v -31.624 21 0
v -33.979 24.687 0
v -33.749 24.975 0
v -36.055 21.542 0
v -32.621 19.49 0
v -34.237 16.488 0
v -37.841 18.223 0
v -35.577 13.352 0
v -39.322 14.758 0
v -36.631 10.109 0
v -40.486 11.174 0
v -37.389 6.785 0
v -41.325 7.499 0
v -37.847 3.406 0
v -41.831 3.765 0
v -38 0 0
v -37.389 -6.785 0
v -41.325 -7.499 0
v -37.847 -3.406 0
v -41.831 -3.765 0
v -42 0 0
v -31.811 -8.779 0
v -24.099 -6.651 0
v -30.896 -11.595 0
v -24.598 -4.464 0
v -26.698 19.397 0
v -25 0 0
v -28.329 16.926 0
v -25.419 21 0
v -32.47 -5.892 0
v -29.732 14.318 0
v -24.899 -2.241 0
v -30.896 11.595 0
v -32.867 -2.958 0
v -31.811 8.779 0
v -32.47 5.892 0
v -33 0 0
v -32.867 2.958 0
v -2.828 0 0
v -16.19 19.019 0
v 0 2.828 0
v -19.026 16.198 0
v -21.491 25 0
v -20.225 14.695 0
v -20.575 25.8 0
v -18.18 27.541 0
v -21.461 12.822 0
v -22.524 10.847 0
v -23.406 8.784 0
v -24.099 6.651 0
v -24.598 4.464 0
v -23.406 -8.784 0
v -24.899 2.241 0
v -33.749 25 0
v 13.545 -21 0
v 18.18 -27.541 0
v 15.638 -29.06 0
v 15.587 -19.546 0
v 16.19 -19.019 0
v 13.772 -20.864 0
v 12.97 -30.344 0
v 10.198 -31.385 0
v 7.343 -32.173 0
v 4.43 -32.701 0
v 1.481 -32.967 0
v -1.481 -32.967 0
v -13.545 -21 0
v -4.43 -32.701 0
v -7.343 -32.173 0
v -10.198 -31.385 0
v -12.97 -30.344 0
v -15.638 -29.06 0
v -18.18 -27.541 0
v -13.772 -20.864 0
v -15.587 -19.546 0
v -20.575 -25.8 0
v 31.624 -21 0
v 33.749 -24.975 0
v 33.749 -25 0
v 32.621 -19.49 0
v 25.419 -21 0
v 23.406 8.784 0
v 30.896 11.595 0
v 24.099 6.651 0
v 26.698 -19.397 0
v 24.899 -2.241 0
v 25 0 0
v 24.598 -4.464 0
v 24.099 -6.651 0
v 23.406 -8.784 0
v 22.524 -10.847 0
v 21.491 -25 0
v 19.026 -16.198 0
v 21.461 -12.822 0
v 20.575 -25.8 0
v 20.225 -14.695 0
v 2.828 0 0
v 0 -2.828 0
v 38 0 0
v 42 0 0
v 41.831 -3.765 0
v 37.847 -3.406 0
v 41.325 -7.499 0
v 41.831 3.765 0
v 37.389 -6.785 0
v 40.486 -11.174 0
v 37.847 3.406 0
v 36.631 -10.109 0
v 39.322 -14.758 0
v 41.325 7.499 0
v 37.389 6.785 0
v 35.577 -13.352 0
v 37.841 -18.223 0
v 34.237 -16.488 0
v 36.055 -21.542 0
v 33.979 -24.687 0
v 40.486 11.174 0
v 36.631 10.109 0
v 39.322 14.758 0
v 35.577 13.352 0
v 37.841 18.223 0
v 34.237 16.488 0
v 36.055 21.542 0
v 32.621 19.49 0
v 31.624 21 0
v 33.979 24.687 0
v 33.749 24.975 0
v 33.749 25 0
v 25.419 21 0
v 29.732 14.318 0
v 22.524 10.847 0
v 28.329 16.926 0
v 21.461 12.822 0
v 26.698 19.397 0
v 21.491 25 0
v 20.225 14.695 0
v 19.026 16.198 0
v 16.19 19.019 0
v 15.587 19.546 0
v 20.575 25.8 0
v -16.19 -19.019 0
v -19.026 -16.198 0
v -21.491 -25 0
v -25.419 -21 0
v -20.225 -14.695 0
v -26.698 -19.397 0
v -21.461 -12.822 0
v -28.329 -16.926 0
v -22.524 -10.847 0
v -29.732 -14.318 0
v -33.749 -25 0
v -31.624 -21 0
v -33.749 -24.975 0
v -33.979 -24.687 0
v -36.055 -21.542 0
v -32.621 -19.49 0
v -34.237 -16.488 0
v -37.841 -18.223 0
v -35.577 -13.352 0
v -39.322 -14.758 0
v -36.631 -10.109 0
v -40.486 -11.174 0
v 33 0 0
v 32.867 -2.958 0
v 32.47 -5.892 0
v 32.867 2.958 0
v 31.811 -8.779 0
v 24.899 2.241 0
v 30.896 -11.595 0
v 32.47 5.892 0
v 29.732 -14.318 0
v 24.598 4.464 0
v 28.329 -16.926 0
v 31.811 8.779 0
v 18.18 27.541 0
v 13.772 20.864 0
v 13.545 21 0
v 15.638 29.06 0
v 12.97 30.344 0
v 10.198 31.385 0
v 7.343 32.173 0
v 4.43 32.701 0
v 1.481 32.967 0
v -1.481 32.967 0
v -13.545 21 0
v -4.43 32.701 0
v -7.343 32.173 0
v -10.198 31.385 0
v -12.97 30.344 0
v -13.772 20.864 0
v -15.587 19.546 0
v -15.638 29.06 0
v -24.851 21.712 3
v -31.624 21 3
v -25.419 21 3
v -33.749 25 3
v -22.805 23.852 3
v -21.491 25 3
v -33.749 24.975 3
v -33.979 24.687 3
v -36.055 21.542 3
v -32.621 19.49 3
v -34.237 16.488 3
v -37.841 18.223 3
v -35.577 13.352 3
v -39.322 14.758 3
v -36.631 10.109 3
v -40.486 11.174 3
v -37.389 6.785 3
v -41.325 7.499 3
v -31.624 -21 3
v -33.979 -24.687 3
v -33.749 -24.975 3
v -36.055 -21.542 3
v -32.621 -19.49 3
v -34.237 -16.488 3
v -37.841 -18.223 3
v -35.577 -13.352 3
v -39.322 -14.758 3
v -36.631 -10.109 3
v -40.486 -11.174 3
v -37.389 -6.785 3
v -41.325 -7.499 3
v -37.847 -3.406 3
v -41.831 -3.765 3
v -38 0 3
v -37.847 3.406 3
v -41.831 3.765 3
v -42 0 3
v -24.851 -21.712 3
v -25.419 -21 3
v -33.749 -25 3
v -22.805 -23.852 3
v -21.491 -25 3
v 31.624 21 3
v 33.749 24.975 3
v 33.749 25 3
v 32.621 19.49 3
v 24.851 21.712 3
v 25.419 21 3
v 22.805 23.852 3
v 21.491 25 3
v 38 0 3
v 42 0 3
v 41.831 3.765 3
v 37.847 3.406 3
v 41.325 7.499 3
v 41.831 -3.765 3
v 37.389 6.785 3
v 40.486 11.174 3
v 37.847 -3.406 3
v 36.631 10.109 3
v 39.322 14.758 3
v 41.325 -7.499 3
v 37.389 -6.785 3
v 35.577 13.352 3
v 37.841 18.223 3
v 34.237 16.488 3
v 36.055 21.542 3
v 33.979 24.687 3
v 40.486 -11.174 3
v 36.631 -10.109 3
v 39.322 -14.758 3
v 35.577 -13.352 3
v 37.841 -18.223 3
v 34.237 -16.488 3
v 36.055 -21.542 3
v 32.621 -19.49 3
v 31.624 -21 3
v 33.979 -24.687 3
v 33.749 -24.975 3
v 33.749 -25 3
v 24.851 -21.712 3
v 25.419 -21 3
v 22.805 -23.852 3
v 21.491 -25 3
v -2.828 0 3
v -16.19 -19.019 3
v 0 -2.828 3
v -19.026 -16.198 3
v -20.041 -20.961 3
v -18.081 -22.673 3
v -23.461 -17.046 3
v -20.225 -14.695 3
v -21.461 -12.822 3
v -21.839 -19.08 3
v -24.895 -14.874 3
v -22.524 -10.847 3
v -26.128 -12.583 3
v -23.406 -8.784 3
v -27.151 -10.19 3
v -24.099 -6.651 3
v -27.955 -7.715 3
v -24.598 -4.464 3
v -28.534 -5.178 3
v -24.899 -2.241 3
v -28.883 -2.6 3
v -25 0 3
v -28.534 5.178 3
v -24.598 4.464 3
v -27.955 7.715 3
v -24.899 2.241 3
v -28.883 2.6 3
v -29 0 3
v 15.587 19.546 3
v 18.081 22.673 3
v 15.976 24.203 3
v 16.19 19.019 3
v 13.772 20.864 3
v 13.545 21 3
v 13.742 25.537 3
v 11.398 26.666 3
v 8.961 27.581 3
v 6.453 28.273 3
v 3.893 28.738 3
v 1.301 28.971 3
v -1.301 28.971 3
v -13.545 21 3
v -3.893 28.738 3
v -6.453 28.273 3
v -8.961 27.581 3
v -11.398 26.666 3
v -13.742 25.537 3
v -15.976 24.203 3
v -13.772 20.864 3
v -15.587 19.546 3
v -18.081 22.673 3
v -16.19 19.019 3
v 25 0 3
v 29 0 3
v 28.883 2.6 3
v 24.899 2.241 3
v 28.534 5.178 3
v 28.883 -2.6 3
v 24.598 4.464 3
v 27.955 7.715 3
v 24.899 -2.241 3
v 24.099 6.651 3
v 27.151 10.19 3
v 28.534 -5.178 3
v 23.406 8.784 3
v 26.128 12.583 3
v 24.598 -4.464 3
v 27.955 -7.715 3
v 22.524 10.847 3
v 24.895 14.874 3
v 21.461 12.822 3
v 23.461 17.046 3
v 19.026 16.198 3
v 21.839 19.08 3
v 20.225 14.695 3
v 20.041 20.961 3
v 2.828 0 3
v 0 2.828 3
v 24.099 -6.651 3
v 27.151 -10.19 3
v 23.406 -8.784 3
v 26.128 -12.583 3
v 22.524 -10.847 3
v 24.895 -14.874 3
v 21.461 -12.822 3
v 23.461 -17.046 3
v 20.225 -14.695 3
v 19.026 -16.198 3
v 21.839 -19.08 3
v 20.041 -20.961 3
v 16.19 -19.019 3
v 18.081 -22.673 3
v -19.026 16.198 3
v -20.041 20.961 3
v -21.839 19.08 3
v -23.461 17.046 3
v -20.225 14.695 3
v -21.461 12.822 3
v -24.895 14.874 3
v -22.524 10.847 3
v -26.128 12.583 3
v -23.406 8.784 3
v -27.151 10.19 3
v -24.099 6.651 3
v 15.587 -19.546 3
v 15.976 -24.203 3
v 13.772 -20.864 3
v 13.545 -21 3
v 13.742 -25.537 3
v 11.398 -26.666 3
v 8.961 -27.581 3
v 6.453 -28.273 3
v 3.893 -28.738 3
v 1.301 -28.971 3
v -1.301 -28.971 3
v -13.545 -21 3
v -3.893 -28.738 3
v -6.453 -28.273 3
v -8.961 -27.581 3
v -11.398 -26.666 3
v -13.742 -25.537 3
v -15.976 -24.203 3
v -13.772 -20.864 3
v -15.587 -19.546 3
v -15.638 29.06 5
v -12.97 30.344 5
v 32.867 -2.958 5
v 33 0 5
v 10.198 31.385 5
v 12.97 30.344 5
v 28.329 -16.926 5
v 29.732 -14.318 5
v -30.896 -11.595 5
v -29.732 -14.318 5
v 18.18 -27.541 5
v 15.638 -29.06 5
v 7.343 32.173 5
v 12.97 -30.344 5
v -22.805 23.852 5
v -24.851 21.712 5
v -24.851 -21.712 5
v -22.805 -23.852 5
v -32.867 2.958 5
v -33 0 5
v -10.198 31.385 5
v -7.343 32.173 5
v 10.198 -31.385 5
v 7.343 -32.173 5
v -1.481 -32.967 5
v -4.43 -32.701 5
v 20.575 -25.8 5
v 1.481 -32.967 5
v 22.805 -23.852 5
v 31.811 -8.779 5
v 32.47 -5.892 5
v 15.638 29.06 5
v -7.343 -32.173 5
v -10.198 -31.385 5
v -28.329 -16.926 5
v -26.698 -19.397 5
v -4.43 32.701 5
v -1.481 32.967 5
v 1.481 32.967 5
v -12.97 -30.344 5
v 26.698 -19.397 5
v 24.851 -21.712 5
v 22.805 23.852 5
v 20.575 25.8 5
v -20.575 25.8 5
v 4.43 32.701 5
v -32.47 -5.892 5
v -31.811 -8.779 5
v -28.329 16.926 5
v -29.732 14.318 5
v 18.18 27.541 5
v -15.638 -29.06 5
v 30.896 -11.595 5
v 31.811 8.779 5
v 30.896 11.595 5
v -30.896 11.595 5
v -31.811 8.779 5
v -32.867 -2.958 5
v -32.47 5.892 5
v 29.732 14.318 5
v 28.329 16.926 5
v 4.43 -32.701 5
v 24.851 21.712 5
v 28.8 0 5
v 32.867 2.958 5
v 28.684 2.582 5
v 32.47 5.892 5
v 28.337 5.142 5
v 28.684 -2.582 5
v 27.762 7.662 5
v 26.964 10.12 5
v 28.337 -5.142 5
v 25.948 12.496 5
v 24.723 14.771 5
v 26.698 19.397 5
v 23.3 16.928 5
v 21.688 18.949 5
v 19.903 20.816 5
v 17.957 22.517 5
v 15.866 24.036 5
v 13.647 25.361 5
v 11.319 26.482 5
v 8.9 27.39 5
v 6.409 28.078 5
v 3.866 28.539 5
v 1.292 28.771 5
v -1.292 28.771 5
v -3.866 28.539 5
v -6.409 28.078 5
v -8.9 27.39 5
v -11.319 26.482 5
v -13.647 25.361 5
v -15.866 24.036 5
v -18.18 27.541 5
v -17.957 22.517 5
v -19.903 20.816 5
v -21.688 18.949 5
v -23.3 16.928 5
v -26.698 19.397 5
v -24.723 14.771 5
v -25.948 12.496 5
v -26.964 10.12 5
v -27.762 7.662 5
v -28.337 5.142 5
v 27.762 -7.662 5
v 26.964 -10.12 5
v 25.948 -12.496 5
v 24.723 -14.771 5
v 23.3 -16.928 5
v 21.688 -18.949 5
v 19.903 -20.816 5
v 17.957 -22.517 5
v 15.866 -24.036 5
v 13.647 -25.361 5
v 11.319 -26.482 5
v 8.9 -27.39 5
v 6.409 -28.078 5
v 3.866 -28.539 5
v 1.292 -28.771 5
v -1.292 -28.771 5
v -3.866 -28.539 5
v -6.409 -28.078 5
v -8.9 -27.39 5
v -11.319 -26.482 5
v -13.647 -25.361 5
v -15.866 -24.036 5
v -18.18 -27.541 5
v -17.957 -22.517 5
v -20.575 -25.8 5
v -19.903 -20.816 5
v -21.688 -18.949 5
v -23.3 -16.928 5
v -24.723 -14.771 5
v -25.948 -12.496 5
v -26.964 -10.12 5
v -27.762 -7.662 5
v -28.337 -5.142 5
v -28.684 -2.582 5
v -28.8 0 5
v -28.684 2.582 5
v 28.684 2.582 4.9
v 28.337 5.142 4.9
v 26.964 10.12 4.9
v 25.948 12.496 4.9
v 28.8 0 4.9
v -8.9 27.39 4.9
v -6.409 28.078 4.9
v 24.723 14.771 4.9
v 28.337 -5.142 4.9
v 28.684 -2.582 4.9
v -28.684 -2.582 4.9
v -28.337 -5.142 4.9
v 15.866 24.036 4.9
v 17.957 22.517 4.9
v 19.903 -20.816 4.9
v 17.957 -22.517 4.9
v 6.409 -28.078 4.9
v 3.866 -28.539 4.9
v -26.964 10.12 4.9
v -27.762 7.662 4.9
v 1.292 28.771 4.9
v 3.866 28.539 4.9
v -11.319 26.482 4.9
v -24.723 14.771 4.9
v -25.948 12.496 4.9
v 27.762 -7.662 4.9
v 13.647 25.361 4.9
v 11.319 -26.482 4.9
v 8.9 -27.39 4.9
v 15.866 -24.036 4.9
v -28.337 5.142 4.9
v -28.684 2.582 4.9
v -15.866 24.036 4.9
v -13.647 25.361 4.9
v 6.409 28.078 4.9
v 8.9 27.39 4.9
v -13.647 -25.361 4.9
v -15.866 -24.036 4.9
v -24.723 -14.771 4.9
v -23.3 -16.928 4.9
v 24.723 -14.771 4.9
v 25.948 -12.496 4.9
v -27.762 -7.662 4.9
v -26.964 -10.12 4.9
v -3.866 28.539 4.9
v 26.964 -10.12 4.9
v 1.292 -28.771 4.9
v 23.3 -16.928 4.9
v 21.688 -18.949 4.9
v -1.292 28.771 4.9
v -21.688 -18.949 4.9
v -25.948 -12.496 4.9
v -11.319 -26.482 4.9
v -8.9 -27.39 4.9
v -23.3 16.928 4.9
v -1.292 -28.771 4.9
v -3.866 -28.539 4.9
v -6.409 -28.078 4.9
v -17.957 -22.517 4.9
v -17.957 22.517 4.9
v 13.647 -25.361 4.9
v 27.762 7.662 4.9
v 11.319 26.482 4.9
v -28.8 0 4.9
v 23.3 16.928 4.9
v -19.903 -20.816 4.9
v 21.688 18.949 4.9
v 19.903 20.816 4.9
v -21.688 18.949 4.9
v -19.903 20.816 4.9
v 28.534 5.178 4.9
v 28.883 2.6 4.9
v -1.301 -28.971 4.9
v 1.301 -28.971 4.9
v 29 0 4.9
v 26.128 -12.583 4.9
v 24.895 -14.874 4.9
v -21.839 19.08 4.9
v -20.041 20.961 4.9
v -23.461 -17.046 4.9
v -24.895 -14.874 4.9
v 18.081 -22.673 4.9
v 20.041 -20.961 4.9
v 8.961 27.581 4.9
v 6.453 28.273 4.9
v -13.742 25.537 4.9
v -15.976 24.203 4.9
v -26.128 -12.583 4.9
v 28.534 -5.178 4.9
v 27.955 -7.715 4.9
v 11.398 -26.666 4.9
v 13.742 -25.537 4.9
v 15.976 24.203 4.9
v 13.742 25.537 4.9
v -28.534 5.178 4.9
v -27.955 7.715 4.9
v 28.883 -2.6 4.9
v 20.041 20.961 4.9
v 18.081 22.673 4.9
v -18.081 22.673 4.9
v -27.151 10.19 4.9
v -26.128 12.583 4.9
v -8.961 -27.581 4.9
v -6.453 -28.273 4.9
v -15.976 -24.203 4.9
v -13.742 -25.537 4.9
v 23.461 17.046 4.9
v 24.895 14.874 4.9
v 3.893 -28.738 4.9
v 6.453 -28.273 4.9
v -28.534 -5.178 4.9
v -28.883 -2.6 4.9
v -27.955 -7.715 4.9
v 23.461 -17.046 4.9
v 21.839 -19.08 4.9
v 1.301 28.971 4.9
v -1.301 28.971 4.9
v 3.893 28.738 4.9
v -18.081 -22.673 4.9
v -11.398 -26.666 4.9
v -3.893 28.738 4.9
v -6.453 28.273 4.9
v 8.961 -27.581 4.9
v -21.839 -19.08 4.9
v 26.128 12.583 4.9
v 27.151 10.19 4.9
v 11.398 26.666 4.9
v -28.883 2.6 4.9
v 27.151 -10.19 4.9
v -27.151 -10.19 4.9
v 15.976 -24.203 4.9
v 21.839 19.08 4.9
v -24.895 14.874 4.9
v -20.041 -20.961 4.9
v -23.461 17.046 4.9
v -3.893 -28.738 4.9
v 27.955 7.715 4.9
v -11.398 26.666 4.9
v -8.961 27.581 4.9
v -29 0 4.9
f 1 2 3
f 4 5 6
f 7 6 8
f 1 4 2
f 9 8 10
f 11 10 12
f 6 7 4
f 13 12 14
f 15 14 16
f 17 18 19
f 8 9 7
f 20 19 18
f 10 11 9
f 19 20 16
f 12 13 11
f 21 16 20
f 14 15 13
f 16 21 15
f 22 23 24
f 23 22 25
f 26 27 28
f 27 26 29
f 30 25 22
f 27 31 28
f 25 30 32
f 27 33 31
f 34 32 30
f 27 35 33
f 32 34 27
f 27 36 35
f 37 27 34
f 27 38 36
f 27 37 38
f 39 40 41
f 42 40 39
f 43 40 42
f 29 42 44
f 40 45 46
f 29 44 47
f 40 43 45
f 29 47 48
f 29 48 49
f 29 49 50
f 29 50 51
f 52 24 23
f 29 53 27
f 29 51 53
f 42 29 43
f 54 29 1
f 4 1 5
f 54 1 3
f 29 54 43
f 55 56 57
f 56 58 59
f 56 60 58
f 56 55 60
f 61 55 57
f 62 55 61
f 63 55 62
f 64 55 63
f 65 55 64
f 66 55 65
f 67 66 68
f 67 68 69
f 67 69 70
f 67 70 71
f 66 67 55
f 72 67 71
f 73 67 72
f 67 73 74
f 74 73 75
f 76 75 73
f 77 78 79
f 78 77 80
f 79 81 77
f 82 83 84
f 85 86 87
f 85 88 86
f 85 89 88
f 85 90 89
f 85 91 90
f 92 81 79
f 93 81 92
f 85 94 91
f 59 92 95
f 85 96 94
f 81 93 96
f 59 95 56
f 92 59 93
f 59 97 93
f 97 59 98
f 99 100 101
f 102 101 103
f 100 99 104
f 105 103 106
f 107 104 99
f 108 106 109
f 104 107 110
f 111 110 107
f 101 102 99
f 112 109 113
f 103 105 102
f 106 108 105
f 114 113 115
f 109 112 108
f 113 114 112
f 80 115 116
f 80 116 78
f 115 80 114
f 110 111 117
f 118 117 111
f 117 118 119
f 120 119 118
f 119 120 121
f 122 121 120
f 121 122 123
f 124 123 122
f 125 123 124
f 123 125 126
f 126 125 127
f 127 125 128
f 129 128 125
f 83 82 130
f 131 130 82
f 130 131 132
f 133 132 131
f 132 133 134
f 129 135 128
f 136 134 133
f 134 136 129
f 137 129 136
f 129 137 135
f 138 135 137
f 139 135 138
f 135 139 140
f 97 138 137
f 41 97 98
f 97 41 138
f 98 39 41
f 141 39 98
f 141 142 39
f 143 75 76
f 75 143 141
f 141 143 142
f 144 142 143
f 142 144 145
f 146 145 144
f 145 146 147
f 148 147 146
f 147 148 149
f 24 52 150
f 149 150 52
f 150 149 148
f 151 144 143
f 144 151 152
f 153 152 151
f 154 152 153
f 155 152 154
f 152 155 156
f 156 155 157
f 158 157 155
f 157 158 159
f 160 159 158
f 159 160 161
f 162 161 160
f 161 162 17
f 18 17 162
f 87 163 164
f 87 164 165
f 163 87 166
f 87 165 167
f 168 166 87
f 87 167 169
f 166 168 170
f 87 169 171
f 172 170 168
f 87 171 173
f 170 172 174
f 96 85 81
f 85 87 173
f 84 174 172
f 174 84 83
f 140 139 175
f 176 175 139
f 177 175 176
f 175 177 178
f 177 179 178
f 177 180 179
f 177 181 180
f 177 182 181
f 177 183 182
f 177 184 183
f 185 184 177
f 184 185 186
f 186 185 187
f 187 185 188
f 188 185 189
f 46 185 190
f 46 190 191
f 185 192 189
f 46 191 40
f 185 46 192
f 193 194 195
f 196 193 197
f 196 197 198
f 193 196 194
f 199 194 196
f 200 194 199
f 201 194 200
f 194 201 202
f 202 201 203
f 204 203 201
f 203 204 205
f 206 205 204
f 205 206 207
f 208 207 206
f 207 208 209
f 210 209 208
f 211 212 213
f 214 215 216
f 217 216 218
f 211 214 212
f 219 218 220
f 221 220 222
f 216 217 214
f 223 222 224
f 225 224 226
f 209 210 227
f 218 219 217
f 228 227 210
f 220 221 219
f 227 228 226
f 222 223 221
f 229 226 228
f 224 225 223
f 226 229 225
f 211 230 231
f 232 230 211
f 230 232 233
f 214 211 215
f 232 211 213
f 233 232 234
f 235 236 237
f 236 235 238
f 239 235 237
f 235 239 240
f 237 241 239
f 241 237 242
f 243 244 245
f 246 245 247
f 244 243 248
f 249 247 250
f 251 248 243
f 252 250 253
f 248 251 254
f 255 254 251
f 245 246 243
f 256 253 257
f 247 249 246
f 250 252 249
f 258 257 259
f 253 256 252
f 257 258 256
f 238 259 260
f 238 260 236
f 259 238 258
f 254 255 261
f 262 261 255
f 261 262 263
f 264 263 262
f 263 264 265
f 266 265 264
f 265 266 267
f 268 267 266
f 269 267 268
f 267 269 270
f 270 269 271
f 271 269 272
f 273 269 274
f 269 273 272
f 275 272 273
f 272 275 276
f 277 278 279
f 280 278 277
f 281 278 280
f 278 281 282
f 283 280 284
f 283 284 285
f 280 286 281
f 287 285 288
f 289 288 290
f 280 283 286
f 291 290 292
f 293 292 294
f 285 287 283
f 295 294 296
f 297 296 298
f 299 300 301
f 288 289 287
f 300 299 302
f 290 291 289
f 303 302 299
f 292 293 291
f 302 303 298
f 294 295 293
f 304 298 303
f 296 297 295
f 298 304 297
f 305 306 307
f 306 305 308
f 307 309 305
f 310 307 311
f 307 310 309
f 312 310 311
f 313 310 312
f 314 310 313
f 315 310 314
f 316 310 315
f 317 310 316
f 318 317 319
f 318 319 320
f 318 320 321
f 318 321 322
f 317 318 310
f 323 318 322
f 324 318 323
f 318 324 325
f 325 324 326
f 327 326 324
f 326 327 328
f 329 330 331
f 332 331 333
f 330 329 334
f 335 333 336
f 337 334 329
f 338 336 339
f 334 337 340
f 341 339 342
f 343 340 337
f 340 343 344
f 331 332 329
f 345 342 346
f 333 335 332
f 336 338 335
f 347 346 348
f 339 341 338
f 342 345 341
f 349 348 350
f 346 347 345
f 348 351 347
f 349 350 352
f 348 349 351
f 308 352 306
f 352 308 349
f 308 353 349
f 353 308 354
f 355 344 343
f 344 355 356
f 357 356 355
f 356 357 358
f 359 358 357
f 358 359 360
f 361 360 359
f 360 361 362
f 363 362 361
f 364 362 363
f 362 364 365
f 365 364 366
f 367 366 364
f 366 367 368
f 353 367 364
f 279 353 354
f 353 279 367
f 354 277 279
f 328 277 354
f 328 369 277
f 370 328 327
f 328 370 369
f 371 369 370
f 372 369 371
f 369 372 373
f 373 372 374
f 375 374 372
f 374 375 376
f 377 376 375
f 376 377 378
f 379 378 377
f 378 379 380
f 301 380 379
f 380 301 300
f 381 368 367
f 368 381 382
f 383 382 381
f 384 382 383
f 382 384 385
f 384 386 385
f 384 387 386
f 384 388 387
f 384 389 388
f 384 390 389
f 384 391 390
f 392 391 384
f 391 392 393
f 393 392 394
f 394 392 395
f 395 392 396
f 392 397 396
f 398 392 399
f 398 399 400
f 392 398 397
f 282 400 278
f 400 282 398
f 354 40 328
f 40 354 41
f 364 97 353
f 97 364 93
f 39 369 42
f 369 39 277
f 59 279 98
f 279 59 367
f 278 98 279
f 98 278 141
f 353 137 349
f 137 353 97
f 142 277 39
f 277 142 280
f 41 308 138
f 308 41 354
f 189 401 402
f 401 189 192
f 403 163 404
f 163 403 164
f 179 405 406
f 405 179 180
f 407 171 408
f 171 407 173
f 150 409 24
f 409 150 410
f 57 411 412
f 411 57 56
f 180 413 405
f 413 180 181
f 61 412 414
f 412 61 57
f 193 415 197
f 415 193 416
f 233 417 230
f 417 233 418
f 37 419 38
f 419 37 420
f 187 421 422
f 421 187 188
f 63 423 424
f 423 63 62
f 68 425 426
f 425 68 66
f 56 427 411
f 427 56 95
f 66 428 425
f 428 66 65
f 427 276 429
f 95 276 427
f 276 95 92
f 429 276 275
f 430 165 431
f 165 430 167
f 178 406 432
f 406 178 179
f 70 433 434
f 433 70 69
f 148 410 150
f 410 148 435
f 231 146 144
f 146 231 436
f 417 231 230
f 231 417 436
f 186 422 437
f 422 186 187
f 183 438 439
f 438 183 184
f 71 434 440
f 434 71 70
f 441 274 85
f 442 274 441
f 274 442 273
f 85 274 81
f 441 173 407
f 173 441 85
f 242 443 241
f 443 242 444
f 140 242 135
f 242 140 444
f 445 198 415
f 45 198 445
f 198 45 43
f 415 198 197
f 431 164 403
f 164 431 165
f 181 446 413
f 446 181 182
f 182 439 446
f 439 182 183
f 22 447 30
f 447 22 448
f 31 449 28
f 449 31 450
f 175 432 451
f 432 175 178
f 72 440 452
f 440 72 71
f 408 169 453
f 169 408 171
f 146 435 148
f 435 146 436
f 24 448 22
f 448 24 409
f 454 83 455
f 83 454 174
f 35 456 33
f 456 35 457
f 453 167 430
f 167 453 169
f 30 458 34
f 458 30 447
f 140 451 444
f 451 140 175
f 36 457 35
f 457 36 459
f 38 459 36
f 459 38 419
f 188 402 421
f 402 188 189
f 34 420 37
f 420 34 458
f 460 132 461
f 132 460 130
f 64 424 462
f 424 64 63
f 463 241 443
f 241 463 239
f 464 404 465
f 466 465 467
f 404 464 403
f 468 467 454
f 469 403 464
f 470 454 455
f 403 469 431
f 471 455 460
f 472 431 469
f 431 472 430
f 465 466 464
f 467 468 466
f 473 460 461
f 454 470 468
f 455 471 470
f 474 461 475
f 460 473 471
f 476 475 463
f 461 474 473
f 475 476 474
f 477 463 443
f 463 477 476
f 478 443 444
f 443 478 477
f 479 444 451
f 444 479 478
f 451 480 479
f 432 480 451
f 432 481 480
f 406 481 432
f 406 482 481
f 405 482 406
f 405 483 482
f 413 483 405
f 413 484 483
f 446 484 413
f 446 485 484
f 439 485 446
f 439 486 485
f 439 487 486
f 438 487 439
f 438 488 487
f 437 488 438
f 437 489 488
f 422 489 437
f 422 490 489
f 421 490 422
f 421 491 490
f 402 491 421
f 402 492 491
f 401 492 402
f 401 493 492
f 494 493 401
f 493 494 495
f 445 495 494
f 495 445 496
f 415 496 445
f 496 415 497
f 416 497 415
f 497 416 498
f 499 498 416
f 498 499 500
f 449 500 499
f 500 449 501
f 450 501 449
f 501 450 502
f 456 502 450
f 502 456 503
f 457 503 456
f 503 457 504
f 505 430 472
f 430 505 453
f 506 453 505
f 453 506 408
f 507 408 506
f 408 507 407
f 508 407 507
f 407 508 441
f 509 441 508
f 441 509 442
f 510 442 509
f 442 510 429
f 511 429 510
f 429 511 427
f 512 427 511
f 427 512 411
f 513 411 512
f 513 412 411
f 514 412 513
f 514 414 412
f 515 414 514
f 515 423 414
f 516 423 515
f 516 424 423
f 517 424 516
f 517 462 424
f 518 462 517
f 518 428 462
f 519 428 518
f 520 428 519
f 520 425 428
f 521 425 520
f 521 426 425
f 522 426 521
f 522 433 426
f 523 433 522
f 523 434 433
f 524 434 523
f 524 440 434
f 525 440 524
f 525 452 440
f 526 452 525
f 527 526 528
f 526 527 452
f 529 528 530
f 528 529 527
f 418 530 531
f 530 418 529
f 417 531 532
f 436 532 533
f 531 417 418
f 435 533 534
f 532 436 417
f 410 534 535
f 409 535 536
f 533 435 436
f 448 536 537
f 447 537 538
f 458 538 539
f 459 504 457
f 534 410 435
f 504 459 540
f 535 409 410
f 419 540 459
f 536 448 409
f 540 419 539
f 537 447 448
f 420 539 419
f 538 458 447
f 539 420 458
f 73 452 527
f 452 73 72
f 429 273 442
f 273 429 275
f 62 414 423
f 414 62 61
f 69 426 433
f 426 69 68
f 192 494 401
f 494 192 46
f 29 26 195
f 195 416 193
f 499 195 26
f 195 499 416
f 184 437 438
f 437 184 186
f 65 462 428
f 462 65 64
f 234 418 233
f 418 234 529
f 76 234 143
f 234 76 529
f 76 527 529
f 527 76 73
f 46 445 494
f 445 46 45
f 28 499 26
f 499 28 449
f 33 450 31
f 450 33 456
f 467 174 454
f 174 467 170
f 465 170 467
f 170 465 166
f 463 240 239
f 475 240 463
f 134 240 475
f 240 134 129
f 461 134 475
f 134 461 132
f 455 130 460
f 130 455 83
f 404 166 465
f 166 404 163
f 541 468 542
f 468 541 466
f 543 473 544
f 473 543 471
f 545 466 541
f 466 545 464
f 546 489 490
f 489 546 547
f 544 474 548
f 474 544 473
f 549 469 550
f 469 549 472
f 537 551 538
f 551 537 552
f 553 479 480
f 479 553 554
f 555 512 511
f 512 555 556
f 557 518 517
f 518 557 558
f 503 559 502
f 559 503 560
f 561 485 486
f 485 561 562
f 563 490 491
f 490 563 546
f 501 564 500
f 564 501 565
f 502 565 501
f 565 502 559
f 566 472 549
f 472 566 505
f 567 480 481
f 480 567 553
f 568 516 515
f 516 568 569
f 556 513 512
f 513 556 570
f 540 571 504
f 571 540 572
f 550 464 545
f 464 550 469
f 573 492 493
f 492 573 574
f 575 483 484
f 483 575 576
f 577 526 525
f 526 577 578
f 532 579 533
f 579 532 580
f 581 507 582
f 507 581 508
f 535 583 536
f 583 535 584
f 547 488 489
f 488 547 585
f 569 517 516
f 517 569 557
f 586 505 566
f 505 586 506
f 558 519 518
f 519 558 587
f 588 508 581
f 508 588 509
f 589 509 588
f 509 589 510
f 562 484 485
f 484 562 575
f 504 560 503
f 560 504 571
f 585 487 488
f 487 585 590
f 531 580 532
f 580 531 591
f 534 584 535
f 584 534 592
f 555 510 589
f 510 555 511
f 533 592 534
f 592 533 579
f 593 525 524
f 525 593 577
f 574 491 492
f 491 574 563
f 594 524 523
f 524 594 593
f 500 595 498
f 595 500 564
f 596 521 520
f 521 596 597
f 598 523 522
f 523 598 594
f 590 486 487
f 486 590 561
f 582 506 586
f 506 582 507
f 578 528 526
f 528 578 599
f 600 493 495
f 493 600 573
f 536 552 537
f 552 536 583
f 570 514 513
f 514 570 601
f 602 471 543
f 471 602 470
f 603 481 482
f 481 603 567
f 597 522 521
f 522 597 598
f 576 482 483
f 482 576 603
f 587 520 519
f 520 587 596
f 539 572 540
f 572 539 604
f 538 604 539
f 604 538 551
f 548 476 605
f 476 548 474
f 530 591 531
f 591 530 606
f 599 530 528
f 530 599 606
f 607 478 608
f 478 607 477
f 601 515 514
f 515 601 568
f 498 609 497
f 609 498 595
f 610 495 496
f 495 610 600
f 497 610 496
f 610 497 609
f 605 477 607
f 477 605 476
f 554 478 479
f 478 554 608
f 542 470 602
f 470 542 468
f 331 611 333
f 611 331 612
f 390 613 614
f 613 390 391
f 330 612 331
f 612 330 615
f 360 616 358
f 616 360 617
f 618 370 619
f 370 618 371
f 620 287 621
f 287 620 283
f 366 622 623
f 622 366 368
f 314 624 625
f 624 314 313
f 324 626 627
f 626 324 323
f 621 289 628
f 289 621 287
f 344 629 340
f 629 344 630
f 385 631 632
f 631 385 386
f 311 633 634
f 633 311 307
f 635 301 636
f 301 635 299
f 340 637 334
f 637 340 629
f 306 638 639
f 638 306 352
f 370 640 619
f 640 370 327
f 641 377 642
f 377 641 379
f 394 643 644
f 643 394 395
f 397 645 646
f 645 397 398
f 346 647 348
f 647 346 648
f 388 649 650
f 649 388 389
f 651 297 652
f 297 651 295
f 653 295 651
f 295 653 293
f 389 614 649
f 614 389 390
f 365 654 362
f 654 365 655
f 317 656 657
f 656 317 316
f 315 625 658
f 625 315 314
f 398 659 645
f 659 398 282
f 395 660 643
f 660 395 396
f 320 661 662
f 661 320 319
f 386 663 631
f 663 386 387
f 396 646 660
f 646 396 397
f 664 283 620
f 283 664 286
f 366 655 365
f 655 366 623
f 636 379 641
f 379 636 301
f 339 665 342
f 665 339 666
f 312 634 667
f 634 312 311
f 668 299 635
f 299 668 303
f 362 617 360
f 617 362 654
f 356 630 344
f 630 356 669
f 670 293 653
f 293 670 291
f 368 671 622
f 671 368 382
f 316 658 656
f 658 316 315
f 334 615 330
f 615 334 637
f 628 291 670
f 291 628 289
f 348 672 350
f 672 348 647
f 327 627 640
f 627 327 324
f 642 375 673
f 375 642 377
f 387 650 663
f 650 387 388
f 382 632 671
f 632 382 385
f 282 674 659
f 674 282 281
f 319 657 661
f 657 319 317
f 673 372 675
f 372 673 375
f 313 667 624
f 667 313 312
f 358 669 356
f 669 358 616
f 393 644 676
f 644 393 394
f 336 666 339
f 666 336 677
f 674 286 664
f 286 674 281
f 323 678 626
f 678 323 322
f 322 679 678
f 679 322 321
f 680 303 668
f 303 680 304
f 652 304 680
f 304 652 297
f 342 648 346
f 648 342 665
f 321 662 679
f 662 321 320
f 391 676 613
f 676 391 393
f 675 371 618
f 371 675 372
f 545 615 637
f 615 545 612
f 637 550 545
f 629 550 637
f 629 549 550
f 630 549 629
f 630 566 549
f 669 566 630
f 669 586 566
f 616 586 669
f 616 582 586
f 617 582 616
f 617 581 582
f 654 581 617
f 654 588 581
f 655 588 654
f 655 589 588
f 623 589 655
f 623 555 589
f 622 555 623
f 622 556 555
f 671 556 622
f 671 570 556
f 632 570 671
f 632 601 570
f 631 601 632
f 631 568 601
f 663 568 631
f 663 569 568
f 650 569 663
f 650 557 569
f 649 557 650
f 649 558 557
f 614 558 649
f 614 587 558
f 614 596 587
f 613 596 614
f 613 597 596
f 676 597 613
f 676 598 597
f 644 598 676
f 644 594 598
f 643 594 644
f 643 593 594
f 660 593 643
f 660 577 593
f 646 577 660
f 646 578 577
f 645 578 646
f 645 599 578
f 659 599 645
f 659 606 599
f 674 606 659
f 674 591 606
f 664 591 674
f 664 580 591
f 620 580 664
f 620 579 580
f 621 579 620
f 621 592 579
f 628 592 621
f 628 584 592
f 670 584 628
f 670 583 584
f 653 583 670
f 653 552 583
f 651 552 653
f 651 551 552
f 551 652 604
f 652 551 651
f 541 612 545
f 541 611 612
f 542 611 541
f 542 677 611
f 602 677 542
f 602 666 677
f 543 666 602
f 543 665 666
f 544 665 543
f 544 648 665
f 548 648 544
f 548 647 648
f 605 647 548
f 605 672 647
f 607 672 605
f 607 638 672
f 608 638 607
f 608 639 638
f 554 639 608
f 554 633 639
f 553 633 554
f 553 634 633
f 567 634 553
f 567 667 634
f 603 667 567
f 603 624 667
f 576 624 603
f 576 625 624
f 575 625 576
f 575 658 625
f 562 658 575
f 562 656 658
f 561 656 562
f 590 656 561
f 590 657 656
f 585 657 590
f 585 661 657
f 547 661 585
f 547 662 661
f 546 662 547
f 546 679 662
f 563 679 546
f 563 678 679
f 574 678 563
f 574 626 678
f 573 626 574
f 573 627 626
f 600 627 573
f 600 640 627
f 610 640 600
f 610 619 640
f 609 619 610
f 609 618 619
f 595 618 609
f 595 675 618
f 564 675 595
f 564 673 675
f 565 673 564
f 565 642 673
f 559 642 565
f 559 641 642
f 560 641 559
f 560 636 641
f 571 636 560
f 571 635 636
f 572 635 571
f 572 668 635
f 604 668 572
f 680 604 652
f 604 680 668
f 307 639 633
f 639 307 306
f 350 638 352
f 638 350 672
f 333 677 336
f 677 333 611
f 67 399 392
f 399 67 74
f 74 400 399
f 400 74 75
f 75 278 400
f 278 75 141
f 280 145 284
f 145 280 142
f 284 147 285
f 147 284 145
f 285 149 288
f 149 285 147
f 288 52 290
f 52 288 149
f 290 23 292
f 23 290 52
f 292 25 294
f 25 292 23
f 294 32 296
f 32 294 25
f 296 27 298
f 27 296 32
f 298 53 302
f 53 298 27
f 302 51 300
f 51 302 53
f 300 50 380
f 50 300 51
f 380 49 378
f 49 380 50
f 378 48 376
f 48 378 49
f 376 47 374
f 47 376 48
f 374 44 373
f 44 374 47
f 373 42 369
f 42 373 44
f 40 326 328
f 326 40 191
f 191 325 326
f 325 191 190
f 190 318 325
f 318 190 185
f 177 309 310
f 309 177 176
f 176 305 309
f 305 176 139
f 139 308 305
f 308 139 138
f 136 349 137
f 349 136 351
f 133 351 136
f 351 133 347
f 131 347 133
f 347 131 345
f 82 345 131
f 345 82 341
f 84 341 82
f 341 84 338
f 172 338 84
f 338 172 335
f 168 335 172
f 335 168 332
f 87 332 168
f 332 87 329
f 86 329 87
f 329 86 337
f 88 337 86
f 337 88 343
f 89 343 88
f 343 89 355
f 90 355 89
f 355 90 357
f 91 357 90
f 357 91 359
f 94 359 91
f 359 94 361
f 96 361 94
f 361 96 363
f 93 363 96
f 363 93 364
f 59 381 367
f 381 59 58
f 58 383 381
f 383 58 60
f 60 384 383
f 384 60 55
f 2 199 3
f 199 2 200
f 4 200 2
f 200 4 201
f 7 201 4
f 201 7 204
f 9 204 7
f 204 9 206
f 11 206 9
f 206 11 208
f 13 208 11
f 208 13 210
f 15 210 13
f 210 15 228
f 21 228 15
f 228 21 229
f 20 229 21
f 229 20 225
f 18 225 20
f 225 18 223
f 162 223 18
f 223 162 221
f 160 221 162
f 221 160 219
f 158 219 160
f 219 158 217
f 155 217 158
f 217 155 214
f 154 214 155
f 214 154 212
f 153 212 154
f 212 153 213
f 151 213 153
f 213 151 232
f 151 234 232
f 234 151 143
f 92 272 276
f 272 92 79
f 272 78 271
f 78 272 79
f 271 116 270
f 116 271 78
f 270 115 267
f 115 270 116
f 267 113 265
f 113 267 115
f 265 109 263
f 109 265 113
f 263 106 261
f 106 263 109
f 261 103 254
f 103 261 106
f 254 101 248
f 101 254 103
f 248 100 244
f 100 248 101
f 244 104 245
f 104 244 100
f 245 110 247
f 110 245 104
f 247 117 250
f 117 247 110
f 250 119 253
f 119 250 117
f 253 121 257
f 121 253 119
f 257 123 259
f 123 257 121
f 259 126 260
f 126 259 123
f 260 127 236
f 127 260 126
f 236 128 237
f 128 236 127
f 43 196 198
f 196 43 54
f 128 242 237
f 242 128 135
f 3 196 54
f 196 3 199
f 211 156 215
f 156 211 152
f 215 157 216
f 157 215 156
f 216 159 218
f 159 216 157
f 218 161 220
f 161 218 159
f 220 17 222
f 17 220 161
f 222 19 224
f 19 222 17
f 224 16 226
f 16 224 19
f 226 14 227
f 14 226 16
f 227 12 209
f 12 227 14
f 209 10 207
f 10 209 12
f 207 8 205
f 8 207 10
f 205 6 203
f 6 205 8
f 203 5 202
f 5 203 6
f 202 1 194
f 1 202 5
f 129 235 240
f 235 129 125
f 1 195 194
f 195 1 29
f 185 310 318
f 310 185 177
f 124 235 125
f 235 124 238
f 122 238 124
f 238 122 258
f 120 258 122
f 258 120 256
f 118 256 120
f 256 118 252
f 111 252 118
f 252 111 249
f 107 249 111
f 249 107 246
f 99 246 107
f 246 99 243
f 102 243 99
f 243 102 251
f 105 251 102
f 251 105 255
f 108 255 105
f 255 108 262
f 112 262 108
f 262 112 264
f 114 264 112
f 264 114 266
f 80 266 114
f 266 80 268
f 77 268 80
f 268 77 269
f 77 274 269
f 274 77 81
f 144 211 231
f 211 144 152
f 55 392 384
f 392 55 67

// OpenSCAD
lens_diameter = 58;       // outer diameter of cap

mount_height = 2;         // height of lip
mount_width = 4;          // width of ring
mount_base = 3;           // height of buckle
mount_lip_height = 0.1;   // lip tip height (to help secure cap)
mount_lip_width = 0.2;    // width of lip tip (to help secure cap)

buckle_gap = 5;           // gap for strap
buckle_width = 42;        // strap width
buckle_thickness = 4;     // thickness of buckle

filled_buckle = false;    // fill the buckle center?
circle_sides = 70;        // number of sides for circles



union()
{
    buckle();
    capmount();
}




module buckle()
{
    buckle_inner = lens_diameter/2 + mount_width + buckle_gap;
    buckle_outer = buckle_inner + buckle_thickness;

    squared_inner = buckle_width;
    squared_outer = buckle_width + 2*buckle_thickness;

    squared_offset = sqrt(pow(buckle_outer,2) - pow(squared_outer/2,2));

    linear_extrude(height=mount_base) union()
    {
        // the arc portion of the buckle
        intersection()
        {
            square([buckle_outer*4, squared_outer], center=true);
            difference()
            {
                circle(buckle_outer, $fn=circle_sides);
                circle(buckle_inner, $fn=circle_sides);
            }
        }

        // the squared-length portion of the buckle
        difference()
        {
            square([squared_offset*2, squared_outer], center=true);
            square([squared_offset*2, squared_inner], center=true);
        }
    }
}

module capmount()
{
    lip_height = mount_base + mount_height;

    cap_outer = lens_diameter/2 + mount_width;
    cap_inner = lens_diameter/2 - mount_width;

    union()
    {
        // the base of the lens cap mount
        linear_extrude(height=mount_base) difference()
        {
            circle(cap_outer, $fn=circle_sides);
            if (!filled_buckle) circle(cap_inner, $fn=circle_sides);
        }

        // generate extra base support if it's not filled
        if (!filled_buckle) for(i=[-45,45])
            linear_extrude(height=mount_base) rotate(i)
                square([lens_diameter, mount_width], center=true);

        // generate the cap friction mount and extra securing lip
        difference()
        {
            linear_extrude(height=lip_height) 
                circle(cap_outer, $fn=circle_sides);
            linear_extrude(height=lip_height) 
                circle(lens_diameter/2 - mount_lip_width, $fn=circle_sides);
            linear_extrude(height=lip_height - mount_lip_height) 
                circle(lens_diameter/2, $fn=circle_sides);
        }
    }
}
